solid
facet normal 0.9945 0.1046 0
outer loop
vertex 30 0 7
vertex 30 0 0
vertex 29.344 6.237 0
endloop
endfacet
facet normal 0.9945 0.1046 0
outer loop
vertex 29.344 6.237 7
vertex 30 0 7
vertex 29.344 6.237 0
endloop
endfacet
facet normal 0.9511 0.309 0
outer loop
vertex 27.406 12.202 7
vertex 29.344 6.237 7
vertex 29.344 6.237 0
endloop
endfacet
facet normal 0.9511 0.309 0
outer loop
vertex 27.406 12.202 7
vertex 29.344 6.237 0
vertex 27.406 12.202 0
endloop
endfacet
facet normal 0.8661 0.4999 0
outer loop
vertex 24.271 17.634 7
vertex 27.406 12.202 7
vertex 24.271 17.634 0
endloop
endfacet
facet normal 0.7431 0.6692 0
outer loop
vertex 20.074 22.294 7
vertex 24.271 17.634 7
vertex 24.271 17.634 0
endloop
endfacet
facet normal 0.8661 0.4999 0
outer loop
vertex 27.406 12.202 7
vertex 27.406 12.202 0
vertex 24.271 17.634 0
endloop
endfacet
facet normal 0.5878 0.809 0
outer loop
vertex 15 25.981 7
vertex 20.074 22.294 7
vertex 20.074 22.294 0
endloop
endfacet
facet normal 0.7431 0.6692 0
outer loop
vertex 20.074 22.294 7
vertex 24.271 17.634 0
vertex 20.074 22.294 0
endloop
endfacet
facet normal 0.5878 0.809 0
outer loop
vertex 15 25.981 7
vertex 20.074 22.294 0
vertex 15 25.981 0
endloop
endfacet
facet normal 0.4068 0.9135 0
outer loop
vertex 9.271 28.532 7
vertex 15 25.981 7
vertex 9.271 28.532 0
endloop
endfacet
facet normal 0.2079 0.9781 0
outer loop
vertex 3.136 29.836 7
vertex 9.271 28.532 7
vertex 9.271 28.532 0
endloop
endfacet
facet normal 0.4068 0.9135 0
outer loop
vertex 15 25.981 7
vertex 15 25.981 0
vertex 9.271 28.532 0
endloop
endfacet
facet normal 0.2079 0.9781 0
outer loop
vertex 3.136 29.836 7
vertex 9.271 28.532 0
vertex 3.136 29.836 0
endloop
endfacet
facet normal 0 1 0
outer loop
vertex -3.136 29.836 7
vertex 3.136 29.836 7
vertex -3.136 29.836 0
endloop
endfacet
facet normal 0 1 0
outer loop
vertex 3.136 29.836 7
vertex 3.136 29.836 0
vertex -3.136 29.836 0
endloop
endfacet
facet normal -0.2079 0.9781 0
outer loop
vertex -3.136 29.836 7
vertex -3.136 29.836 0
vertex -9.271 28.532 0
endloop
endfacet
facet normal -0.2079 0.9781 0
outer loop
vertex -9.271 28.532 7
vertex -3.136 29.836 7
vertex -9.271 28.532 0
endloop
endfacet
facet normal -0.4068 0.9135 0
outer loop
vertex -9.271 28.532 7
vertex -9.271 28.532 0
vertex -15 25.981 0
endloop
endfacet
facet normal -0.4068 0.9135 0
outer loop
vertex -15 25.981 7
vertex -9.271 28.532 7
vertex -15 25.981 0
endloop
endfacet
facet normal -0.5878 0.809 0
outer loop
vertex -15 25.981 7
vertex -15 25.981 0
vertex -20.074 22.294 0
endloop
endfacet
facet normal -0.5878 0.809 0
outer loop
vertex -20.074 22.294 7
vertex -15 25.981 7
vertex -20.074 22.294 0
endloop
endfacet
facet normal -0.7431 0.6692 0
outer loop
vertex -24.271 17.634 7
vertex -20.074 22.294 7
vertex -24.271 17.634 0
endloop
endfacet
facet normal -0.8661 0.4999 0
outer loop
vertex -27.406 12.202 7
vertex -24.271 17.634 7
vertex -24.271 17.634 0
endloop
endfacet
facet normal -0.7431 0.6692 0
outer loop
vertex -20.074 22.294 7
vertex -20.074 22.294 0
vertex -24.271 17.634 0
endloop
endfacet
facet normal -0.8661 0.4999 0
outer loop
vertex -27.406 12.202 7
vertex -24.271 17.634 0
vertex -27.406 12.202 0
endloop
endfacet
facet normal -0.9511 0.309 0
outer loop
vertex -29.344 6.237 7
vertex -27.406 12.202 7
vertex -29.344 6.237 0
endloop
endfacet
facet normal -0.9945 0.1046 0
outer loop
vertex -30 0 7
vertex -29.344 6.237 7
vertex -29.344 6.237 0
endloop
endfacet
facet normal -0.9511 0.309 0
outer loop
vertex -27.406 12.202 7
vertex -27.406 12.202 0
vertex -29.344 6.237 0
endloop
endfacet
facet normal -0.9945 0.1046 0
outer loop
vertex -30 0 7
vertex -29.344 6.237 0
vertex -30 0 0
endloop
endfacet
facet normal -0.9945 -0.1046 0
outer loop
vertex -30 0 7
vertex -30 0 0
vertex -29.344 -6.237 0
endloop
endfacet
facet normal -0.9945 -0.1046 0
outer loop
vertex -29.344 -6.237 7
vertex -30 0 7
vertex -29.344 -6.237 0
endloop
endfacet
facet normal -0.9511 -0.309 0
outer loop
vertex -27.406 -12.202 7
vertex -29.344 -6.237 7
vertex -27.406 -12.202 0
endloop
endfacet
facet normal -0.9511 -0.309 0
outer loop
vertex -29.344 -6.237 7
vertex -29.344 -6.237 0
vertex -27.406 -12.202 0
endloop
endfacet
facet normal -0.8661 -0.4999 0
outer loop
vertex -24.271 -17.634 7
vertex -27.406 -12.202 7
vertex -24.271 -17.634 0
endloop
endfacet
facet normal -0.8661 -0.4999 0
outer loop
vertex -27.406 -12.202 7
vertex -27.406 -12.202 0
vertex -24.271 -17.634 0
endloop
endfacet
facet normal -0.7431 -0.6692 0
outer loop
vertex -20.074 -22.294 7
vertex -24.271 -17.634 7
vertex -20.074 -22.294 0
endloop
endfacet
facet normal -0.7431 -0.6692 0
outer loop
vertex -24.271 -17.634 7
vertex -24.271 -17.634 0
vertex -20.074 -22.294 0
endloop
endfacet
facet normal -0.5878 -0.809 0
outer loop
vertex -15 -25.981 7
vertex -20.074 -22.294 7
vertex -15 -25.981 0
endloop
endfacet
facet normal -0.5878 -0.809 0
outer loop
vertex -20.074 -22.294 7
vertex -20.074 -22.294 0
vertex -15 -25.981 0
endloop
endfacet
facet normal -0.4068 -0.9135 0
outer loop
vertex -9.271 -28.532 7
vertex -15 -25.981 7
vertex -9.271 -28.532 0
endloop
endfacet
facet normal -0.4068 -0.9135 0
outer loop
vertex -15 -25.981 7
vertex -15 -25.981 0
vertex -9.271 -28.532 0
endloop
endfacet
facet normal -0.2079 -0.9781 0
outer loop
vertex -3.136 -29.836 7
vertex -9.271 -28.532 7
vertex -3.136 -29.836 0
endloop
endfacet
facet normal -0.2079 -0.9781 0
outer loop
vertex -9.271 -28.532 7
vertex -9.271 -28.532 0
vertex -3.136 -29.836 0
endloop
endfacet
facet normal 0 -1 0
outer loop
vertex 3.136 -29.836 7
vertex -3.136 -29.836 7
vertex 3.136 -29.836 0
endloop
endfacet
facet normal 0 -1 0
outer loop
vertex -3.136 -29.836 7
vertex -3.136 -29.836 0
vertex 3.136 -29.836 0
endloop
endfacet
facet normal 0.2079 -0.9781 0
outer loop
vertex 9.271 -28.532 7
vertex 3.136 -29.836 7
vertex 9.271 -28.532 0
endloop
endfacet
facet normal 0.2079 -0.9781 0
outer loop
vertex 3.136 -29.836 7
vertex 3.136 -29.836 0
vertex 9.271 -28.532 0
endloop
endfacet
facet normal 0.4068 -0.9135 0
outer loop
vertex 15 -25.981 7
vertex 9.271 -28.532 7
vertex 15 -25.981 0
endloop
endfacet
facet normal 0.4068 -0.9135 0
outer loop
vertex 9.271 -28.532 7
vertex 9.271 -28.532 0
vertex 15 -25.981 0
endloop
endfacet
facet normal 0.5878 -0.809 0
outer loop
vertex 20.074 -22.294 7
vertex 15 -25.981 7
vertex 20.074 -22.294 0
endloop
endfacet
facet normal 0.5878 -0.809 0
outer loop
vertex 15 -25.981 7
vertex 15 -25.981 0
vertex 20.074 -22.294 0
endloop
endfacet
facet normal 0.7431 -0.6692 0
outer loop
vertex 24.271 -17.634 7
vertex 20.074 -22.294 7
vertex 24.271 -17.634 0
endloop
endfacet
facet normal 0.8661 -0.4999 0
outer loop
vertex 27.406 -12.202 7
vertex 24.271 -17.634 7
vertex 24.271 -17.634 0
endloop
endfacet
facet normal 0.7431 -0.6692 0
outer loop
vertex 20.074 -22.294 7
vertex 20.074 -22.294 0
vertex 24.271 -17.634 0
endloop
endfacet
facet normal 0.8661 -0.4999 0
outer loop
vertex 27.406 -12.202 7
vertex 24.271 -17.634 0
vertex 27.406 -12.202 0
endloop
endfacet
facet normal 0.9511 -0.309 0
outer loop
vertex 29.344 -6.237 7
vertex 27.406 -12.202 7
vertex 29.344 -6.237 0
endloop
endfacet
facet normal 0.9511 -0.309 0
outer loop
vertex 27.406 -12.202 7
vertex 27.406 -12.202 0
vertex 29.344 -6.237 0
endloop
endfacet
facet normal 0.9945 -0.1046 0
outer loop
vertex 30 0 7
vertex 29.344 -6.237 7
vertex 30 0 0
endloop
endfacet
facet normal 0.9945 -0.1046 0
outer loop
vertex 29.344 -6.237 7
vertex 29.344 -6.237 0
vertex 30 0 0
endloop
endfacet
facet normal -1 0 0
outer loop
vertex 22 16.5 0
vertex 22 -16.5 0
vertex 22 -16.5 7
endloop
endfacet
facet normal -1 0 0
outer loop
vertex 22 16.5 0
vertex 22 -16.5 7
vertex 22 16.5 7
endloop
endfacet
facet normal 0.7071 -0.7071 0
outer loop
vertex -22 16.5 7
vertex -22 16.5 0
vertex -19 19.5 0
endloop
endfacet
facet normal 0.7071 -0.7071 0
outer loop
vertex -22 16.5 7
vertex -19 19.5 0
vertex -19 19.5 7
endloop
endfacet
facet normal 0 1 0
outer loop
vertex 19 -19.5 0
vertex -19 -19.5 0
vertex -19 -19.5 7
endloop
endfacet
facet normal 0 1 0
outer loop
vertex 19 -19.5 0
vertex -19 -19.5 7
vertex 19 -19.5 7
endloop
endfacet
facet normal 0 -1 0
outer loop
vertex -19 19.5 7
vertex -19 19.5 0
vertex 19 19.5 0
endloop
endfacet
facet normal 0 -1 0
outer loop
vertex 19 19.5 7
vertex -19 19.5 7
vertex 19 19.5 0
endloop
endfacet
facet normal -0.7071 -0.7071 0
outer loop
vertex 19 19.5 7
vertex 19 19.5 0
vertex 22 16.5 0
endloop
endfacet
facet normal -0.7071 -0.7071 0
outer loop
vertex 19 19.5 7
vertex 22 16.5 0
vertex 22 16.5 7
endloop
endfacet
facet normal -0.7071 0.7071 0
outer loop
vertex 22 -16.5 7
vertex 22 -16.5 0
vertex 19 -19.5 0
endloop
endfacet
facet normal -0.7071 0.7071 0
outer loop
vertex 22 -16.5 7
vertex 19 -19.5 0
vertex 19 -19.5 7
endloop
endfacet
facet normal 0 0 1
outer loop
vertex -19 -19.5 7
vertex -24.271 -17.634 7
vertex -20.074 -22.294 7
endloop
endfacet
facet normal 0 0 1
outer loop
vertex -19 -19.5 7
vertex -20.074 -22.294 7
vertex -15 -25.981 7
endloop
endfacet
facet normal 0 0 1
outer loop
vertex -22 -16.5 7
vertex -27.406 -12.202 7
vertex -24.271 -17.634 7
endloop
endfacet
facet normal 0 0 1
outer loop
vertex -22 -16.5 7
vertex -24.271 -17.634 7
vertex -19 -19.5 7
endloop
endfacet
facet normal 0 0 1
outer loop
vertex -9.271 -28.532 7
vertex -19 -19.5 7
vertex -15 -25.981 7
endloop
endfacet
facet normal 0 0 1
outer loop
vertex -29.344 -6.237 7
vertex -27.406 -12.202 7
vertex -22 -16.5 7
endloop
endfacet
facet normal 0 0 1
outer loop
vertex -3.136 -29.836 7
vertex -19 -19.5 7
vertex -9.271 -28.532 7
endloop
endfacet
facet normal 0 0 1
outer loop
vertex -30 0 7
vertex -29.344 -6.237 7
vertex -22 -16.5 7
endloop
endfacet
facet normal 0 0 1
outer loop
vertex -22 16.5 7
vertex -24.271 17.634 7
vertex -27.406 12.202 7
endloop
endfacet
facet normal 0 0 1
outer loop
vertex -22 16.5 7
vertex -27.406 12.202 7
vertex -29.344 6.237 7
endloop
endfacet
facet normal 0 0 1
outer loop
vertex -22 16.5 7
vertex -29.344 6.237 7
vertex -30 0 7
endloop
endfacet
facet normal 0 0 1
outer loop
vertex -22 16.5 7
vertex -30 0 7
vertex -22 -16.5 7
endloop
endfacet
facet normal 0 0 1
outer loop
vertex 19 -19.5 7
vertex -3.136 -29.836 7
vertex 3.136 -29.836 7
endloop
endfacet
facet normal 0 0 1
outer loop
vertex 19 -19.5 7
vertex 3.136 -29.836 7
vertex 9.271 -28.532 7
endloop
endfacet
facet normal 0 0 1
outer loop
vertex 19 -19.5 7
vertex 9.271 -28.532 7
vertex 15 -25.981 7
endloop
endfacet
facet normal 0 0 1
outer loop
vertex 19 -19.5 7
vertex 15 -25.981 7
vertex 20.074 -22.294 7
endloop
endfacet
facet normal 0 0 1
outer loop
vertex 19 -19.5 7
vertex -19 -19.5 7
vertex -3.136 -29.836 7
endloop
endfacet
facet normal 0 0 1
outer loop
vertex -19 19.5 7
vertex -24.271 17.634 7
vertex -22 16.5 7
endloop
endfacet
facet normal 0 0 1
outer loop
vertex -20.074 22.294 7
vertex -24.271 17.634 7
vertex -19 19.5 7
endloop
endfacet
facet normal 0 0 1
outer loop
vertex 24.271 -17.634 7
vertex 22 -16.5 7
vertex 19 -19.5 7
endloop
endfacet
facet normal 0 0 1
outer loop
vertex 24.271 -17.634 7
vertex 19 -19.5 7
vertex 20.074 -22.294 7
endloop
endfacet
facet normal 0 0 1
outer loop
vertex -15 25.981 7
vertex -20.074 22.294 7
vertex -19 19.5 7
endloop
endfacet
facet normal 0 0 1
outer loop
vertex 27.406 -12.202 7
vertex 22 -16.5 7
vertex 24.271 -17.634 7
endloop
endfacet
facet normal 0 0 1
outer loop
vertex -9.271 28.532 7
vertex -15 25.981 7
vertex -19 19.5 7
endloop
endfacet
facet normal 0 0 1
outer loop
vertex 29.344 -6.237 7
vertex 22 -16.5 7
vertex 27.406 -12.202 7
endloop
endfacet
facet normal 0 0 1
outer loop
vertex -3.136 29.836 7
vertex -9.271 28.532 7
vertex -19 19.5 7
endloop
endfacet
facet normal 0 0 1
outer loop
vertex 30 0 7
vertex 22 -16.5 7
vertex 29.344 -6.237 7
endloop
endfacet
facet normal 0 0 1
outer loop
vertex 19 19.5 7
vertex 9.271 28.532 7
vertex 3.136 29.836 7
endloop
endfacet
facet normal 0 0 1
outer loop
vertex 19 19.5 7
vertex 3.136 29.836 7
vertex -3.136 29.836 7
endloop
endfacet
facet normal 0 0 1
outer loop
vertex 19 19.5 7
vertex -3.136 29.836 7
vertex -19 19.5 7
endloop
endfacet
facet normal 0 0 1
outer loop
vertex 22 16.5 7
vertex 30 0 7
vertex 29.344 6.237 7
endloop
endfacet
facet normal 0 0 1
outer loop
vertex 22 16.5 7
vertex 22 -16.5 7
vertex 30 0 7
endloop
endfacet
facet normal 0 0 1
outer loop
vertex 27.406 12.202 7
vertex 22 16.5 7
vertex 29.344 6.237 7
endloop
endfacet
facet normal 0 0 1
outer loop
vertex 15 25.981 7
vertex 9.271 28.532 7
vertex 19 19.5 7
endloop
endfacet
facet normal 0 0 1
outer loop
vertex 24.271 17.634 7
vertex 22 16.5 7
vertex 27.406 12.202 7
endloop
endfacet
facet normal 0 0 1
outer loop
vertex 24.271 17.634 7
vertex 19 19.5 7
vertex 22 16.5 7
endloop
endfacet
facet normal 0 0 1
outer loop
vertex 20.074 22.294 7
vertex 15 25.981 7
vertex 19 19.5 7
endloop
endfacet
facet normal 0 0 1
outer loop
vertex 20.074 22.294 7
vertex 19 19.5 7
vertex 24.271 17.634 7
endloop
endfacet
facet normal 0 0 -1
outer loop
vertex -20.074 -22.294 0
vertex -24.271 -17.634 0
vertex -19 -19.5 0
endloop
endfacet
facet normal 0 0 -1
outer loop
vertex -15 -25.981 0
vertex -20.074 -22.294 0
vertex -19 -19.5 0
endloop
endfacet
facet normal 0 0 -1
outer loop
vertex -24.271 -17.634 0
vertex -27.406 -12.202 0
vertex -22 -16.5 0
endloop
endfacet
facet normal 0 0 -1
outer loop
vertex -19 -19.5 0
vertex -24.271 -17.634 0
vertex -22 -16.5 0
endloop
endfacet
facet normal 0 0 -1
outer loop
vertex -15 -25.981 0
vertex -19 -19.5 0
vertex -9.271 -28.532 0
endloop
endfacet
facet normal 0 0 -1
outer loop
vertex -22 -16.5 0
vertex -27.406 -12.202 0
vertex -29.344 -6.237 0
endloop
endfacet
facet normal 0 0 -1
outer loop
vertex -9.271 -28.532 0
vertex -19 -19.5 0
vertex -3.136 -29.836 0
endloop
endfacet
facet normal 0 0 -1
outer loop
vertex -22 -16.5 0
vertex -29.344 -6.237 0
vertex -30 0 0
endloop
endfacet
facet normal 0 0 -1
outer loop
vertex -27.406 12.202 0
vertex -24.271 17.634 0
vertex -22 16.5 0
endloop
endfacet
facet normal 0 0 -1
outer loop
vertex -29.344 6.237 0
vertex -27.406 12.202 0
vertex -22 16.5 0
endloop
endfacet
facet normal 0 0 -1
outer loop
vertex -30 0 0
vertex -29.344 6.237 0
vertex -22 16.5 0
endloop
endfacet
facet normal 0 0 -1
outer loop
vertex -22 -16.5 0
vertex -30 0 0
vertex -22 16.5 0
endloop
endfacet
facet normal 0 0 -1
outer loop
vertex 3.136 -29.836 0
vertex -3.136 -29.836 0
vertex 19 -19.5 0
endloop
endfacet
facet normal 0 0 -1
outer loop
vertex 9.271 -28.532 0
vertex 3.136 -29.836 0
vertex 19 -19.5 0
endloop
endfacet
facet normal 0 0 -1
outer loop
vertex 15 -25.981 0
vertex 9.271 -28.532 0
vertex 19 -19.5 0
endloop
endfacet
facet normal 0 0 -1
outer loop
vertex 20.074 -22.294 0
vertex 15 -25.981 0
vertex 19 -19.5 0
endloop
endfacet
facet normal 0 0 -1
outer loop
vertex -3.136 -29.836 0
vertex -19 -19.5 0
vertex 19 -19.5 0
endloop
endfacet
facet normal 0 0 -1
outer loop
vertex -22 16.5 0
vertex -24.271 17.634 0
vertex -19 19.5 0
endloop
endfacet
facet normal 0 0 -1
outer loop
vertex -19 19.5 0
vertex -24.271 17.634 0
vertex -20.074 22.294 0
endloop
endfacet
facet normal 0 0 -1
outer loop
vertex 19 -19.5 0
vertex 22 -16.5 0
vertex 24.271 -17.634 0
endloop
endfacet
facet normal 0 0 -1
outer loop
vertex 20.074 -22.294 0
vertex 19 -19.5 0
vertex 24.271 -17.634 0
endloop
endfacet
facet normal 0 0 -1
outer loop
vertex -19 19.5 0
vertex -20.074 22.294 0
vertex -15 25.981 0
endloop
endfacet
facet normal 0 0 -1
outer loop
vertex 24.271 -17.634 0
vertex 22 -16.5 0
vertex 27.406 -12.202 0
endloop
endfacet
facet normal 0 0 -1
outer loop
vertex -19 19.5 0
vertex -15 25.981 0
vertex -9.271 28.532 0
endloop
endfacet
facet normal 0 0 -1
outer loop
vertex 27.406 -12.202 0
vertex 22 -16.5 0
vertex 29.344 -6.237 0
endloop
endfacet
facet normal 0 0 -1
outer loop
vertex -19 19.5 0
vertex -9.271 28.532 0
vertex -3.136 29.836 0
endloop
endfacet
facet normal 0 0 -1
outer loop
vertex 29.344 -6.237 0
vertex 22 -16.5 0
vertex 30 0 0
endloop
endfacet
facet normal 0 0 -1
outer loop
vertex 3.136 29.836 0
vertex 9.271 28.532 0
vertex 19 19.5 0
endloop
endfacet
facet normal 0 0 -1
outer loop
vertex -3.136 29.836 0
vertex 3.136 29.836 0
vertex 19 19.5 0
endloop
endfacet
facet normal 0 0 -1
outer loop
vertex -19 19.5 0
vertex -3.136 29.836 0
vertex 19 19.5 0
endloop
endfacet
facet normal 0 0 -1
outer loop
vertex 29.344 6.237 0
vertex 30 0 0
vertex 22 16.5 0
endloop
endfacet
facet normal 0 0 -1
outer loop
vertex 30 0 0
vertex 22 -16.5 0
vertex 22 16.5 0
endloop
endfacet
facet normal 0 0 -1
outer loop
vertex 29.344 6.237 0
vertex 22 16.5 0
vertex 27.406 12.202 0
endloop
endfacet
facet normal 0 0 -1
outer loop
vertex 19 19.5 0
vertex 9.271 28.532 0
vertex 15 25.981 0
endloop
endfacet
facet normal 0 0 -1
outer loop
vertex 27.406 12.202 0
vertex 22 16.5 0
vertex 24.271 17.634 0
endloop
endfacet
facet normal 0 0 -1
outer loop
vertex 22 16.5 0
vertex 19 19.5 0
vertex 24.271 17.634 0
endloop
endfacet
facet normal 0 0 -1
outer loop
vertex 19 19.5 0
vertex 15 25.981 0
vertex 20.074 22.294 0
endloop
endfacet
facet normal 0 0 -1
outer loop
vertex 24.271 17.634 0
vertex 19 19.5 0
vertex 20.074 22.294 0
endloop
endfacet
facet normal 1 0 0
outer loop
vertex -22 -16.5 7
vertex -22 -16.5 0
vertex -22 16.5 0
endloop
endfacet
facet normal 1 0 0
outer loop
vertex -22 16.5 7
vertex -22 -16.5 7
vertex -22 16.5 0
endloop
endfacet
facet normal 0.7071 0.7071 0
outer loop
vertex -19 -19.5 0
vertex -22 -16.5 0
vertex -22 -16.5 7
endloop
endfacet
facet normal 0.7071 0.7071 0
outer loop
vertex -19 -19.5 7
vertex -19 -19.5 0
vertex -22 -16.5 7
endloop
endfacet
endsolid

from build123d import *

# Parameters (mm, degrees)
F0_R     = 30
F0_W     = 44
F0_H     = 39
F1_DEPTH = 7
F2_SIZE  = 3


with BuildPart() as f1:
    # F0 (on Top) → F1 (new body)
    with BuildSketch(Plane.XY):
        Circle(F0_R)
        Rectangle(F0_W, F0_H, mode=Mode.SUBTRACT)
    extrude(amount=F1_DEPTH)

    # F2
    f2_edges = [f1.edges().sort_by_distance(p)[0] for p in [
        (-22, 19.5, 3.5),
        (22, 19.5, 3.5),
        (-22, -19.5, 3.5),
        (22, -19.5, 3.5),
    ]]
    chamfer(f2_edges, length=F2_SIZE)


solid = f1.part
